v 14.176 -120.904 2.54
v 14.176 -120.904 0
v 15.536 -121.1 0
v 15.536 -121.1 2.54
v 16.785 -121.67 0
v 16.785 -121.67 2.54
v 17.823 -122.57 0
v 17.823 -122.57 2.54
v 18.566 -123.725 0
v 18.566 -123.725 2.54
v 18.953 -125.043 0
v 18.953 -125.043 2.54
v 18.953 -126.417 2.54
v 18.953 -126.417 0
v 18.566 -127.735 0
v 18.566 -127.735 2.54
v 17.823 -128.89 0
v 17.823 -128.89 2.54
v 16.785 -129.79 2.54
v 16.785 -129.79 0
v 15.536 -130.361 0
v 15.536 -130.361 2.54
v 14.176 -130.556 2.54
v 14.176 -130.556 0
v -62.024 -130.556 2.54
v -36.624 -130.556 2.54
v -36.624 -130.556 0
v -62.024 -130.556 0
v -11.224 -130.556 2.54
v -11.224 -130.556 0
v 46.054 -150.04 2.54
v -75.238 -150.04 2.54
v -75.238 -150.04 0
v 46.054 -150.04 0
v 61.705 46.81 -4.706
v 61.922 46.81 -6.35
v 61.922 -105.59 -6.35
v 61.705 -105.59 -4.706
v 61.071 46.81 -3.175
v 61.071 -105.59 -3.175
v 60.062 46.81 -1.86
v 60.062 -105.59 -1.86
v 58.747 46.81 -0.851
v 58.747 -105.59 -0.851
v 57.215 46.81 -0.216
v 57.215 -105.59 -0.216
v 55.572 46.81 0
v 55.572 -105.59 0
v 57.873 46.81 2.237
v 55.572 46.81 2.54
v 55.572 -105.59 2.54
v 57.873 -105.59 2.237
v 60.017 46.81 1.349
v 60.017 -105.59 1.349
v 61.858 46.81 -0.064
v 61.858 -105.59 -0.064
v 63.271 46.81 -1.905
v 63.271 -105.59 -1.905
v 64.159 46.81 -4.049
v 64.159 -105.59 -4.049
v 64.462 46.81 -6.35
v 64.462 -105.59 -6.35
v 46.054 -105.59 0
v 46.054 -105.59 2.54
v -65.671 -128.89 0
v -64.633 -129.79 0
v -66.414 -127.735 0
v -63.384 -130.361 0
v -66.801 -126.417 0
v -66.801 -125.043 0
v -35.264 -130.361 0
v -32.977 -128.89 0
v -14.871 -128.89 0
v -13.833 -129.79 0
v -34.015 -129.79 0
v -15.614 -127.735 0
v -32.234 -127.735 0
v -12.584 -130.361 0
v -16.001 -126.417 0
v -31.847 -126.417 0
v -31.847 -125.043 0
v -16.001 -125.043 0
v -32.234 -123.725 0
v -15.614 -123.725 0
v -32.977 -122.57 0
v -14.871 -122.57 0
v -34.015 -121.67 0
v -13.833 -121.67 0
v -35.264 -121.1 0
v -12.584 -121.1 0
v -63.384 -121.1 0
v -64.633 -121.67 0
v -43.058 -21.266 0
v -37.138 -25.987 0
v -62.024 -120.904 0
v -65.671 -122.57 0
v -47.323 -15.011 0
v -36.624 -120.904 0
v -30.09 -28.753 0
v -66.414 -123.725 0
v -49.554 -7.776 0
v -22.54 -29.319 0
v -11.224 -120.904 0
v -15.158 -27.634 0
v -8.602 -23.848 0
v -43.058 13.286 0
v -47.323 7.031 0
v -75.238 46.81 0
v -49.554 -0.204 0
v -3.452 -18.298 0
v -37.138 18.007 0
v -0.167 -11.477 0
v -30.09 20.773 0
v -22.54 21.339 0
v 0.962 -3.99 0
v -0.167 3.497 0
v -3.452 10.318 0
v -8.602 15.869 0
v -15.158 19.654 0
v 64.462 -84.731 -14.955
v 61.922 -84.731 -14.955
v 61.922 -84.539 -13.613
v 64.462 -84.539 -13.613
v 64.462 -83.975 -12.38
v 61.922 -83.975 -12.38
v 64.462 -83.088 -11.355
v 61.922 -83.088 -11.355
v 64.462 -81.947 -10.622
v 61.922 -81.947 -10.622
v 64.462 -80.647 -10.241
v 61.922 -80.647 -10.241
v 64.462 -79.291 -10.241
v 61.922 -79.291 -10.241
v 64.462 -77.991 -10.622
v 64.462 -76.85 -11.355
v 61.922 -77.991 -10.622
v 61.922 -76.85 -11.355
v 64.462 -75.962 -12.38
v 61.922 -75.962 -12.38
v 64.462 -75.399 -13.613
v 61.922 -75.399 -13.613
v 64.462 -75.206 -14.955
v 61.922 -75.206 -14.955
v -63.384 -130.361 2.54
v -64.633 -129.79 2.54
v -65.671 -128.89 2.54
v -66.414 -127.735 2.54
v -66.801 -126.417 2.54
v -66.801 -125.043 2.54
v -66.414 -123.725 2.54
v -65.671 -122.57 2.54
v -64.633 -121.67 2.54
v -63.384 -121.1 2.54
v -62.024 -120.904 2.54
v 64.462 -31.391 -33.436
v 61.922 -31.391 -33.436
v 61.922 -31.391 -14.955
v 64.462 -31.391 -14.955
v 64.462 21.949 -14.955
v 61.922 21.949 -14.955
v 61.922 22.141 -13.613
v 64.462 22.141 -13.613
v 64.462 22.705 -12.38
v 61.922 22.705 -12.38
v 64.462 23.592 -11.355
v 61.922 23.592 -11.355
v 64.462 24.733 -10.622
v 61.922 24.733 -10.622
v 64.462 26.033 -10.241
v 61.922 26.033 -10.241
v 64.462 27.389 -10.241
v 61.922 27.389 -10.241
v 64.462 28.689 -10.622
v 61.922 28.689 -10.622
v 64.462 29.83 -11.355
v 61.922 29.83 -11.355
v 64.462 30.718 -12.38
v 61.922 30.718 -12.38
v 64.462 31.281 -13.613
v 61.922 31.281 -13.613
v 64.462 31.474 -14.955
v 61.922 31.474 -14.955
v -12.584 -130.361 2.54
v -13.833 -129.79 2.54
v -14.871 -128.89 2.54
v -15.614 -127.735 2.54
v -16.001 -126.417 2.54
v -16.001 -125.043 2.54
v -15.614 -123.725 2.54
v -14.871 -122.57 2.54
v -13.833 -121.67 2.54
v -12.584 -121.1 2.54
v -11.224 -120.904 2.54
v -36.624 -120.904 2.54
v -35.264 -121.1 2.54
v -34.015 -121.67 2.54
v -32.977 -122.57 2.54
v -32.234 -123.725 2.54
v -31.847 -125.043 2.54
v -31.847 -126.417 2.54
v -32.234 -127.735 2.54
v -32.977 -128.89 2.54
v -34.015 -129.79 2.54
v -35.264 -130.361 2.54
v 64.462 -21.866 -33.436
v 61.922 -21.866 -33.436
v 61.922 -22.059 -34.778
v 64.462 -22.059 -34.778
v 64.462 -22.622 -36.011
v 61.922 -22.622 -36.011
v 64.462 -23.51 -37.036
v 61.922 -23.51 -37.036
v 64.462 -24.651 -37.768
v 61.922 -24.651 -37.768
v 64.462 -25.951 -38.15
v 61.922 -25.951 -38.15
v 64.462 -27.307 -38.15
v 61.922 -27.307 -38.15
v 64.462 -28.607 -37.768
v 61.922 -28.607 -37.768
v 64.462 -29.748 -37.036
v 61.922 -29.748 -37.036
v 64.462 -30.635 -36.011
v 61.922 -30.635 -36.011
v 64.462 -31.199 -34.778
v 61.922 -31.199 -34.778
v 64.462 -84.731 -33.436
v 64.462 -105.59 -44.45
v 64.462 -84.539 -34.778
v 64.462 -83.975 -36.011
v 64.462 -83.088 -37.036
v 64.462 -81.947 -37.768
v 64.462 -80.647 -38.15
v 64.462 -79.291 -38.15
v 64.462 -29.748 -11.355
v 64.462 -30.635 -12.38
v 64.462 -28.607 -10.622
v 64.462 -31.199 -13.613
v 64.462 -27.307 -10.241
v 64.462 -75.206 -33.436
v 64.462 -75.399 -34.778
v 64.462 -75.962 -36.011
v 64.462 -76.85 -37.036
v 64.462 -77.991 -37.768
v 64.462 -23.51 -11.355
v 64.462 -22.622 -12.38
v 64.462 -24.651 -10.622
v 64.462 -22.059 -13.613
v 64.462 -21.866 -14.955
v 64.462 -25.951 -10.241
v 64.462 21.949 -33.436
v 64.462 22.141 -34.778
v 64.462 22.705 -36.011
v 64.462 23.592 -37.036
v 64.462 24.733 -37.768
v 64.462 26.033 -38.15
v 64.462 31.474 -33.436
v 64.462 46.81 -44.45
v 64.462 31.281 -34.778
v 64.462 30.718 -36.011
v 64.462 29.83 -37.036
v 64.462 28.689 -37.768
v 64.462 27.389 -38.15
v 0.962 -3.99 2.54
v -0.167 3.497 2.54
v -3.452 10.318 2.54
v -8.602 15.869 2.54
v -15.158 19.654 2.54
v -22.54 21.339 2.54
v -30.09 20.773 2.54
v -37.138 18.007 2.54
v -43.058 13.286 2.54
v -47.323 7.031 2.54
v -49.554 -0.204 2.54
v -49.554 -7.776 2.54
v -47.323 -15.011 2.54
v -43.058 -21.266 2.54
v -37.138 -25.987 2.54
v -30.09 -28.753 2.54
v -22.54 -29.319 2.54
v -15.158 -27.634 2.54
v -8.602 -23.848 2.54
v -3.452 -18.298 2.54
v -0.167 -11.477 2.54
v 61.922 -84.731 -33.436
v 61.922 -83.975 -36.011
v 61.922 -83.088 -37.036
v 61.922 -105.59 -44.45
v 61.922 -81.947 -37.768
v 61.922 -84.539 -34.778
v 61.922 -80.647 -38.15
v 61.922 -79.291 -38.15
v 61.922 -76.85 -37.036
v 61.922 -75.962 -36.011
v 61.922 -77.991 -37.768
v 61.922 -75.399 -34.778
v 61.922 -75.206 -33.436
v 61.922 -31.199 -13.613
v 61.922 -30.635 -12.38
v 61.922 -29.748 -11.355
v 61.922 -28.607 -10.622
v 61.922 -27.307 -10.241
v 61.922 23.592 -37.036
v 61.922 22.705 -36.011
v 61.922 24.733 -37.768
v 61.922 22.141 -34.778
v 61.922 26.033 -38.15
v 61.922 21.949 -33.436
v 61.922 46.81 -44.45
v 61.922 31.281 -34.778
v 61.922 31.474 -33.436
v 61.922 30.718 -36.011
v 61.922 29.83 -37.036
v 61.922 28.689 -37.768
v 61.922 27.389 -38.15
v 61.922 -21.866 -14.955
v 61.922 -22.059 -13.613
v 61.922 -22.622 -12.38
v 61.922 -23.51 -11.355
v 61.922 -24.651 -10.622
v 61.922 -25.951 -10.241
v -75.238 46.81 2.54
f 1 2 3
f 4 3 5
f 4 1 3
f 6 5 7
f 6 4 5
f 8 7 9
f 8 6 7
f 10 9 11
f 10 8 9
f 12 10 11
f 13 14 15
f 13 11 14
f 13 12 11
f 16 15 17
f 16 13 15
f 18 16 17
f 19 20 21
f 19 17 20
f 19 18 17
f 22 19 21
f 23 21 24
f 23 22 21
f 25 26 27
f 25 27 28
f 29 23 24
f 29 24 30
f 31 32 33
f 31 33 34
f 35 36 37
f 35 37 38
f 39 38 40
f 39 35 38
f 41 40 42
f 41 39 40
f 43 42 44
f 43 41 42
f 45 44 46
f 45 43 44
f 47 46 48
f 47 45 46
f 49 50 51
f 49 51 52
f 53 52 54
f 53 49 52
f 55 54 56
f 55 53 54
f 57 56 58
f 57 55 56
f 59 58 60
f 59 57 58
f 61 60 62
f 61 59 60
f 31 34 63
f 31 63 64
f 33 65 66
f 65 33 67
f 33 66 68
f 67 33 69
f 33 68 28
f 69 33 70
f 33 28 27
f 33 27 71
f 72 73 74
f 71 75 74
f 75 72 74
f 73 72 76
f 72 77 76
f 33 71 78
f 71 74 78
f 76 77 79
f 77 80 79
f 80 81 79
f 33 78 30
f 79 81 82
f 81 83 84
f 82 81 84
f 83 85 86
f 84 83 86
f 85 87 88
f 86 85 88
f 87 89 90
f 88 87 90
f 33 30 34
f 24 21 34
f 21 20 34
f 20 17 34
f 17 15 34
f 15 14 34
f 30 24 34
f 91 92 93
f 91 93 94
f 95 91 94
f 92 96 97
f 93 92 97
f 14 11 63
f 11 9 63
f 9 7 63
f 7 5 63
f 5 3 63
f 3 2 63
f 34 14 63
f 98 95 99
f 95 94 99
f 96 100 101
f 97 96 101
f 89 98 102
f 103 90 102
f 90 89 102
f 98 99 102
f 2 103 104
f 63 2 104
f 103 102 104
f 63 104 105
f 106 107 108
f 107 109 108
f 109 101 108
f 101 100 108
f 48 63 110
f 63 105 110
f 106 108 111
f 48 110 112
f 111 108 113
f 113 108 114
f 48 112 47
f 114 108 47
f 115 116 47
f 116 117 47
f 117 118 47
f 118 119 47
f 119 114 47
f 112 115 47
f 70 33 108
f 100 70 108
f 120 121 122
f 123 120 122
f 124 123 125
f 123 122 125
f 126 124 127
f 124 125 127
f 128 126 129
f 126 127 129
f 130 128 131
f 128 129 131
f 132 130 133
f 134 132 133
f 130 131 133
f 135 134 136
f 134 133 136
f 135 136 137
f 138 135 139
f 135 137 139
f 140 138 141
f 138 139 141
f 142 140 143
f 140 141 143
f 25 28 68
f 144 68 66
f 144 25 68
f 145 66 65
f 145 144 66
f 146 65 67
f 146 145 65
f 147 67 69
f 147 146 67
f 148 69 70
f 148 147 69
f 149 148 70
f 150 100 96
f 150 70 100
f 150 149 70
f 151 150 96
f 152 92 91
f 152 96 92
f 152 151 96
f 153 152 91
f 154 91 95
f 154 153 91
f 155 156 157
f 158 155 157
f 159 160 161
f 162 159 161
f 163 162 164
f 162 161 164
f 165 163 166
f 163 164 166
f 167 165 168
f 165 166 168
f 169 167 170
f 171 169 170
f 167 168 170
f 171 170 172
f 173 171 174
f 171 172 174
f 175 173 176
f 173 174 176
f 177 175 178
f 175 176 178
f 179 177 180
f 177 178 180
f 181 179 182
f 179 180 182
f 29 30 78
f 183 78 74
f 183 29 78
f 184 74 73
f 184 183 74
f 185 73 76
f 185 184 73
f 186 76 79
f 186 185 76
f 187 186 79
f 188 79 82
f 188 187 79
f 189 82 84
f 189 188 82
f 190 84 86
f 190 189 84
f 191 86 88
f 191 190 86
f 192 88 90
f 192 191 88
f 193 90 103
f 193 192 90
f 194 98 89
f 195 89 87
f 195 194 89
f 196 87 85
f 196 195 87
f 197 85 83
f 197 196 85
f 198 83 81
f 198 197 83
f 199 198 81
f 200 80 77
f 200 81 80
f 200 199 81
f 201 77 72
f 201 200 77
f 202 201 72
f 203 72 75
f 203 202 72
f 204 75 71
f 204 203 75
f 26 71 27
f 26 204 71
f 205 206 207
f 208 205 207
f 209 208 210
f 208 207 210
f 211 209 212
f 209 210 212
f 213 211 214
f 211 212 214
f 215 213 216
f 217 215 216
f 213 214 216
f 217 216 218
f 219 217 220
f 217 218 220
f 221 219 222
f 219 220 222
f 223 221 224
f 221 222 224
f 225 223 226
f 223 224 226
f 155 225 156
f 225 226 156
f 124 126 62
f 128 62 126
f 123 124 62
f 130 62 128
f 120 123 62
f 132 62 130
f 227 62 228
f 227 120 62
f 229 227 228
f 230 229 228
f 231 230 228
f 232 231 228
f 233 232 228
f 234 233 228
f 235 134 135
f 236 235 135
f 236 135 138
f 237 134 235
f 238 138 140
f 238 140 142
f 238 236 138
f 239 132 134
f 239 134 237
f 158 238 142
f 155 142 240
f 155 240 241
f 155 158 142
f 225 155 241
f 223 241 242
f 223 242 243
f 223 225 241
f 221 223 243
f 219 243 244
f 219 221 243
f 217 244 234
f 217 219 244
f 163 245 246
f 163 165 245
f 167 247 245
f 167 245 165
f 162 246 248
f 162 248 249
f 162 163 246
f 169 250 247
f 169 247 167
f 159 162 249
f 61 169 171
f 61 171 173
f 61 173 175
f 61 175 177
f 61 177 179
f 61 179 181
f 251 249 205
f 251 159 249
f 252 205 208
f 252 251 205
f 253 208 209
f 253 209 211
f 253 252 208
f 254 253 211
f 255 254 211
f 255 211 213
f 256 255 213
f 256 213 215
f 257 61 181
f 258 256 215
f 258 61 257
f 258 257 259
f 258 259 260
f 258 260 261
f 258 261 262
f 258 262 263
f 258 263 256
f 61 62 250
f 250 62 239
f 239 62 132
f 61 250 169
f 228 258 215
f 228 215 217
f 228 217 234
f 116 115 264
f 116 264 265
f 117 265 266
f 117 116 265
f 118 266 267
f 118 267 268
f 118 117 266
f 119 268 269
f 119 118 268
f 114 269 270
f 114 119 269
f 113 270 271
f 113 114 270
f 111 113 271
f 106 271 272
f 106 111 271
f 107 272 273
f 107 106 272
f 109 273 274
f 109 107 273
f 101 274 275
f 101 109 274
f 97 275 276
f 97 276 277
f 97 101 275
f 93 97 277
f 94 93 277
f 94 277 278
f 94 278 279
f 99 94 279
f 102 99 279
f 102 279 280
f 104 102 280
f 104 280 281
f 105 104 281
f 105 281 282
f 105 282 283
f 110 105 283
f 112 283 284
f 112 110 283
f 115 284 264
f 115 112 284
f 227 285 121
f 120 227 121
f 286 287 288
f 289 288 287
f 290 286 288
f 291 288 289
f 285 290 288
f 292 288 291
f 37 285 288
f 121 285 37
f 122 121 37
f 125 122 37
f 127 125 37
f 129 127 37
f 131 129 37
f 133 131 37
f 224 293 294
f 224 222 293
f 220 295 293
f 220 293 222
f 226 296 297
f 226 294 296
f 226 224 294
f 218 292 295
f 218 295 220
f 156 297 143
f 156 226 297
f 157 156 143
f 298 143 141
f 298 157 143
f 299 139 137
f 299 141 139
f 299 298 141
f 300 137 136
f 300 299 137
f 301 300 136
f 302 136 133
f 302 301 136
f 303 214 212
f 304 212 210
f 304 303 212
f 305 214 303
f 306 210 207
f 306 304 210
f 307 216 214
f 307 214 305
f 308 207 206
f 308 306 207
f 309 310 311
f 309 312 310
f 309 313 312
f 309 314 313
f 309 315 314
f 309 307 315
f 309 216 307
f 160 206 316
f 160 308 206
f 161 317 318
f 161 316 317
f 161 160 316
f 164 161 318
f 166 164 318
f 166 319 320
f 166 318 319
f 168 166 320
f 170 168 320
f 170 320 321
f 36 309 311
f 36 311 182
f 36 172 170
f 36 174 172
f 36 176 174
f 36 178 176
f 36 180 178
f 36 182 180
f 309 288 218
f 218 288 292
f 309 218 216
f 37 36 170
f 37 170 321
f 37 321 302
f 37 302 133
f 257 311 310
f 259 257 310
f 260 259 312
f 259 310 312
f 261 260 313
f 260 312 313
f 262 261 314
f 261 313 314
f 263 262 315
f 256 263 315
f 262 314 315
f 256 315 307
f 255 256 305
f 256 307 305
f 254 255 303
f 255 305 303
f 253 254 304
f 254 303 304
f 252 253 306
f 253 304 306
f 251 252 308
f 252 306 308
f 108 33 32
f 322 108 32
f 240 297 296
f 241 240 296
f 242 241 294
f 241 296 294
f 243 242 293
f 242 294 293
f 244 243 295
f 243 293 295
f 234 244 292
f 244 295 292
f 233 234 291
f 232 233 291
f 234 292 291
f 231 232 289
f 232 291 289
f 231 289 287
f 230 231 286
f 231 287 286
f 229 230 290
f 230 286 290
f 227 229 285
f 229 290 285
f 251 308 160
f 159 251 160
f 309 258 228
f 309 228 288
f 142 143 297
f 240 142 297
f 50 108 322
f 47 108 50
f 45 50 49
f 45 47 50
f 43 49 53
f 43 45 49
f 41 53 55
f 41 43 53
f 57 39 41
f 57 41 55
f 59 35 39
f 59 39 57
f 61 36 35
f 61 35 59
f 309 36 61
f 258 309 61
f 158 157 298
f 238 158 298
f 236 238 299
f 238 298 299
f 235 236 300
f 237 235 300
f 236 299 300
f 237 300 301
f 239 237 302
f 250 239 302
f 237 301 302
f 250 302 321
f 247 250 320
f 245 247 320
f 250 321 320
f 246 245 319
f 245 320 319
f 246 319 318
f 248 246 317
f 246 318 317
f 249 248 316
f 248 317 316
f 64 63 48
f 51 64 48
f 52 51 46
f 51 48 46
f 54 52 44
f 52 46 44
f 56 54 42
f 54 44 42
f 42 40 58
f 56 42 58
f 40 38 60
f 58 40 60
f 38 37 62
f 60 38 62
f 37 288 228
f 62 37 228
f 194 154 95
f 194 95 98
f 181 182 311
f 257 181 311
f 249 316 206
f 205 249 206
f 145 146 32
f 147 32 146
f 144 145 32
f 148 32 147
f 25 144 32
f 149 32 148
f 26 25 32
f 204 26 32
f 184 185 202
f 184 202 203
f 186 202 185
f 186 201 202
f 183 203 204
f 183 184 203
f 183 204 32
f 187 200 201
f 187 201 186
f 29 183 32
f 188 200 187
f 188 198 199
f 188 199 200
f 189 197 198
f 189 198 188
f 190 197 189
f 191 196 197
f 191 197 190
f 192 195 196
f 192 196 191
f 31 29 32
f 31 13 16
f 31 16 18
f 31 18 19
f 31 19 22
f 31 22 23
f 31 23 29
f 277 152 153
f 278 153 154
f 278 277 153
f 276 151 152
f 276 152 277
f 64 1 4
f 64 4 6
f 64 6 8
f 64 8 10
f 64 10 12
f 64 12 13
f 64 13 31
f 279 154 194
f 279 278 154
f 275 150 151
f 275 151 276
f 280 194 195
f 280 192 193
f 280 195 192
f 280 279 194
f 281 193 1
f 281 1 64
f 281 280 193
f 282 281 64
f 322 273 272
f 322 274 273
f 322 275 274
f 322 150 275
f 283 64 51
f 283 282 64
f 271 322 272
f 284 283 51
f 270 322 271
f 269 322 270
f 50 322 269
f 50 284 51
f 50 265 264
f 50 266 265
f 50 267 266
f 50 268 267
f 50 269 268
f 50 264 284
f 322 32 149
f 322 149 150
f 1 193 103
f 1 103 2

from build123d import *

# Parameters (mm, degrees)
SKETCH1_W                    = 139.7
SKETCH1_H                    = 152.4
SKETCH1_R                    = 25.4
BOSS_EXTRUDE1_DEPTH          = 2.54
EDGE_FLANGE1_STRIP_W         = 22.86
EDGE_FLANGE1_STRIP_H         = 2.54
EDGE_FLANGE1_STRIP_CUT_DEPTH = 152.4
EDGE_FLANGE1_DEPTH           = 152.4
CUT_EXTRUDE3_DEPTH           = 2.54
SKETCH10_W                   = 121.292072418
SKETCH10_H                   = 2.54
BOSS_EXTRUDE2_DEPTH          = 44.45
CUT_EXTRUDE2_DEPTH           = 44.45


# Sheet-metal steps are written as plain solids
with BuildPart() as part:
    # Sketch1 → Boss-Extrude1 (new body)
    with BuildSketch(Plane.XY):
        with Locations((-5.388148668, -29.389901823)):
            Rectangle(SKETCH1_W, SKETCH1_H)
        with Locations((-24.438148668, -3.989901823)):
            Circle(SKETCH1_R, mode=Mode.SUBTRACT)
    extrude(amount=BOSS_EXTRUDE1_DEPTH)

    # Edge-Flange1 strip (across the edge) → Edge-Flange1 strip cut (cut)
    with BuildSketch(Plane(origin=(64.461851332, 46.810098177, 0), x_dir=(-1, 0, 0), z_dir=(0, -1, 0))):
        with Locations((-2.54, -1.27)):
            Rectangle(EDGE_FLANGE1_STRIP_W, EDGE_FLANGE1_STRIP_H)
    extrude(amount=EDGE_FLANGE1_STRIP_CUT_DEPTH, mode=Mode.SUBTRACT)

    # Edge-Flange1 section (across the edge) → Edge-Flange1 (add)
    with BuildSketch(Plane(origin=(64.461851332, 46.810098177, 0), x_dir=(-1, 0, 0), z_dir=(0, -1, 0))):
        with BuildLine():
            Line((0, 6.35), (0, 44.45))
            Line((0, 44.45), (2.54, 44.45))
            Line((2.54, 44.45), (2.54, 6.35))
            ThreePointArc((2.54, 6.35), (4.399871939, 1.859871939), (8.89, 0))
            Line((8.89, 0), (8.89, -2.54))
            ThreePointArc((8.89, -2.54), (2.603820715, 0.063820715), (0, 6.35))
        make_face()
    extrude(amount=EDGE_FLANGE1_DEPTH)

    # Sketch9 → Cut-Extrude3 (cut)
    with BuildSketch(Plane.ZY.offset(-61.921851332)):
        with BuildLine():
            Line((-14.954545697, 31.473568276), (-33.436292004, 31.473568276))
            ThreePointArc((-33.436292004, 31.473568276), (-38.198792004, 26.711068276), (-33.436292004, 21.948568276))
            Line((-33.436292004, 21.948568276), (-14.954545697, 21.948568276))
            ThreePointArc((-14.954545697, 21.948568276), (-10.192045697, 26.711068276), (-14.954545697, 31.473568276))
        make_face()
        with BuildLine():
            Line((-14.954545697, -21.866431724), (-33.436292004, -21.866431724))
            ThreePointArc((-33.436292004, -21.866431724), (-38.198792004, -26.628931724), (-33.436292004, -31.391431724))
            Line((-33.436292004, -31.391431724), (-14.954545697, -31.391431724))
            ThreePointArc((-14.954545697, -31.391431724), (-10.192045697, -26.628931724), (-14.954545697, -21.866431724))
        make_face()
        with BuildLine():
            Line((-14.954545697, -75.206431724), (-33.436292004, -75.206431724))
            ThreePointArc((-33.436292004, -75.206431724), (-38.198792004, -79.968931724), (-33.436292004, -84.731431724))
            Line((-33.436292004, -84.731431724), (-14.954545697, -84.731431724))
            ThreePointArc((-14.954545697, -84.731431724), (-10.192045697, -79.968931724), (-14.954545697, -75.206431724))
        make_face()
    extrude(amount=-CUT_EXTRUDE3_DEPTH, mode=Mode.SUBTRACT)

    # Sketch10 → Boss-Extrude2 (add)
    with BuildSketch(Plane.XZ.offset(105.589901823)):
        with Locations((-14.592112459, 1.27)):
            Rectangle(SKETCH10_W, SKETCH10_H)
    extrude(amount=BOSS_EXTRUDE2_DEPTH)

    # Sketch11 → Cut-Extrude2 (cut)
    with BuildSketch(Plane.XY.offset(2.54)):
        with BuildLine():
            Line((-62.024050091, -120.904110835), (-36.624050091, -120.904110835))
            ThreePointArc((-36.624050091, -120.904110835), (-31.798050091, -125.730110835), (-36.624050091, -130.556110835))
            Line((-36.624050091, -130.556110835), (-62.024050091, -130.556110835))
            ThreePointArc((-62.024050091, -130.556110835), (-66.850050091, -125.730110835), (-62.024050091, -120.904110835))
        make_face()
        with BuildLine():
            Line((-11.224050091, -120.904110835), (14.175949909, -120.904110835))
            ThreePointArc((14.175949909, -120.904110835), (19.001949909, -125.730110835), (14.175949909, -130.556110835))
            Line((14.175949909, -130.556110835), (-11.224050091, -130.556110835))
            ThreePointArc((-11.224050091, -130.556110835), (-16.050050091, -125.730110835), (-11.224050091, -120.904110835))
        make_face()
    extrude(amount=-CUT_EXTRUDE2_DEPTH, mode=Mode.SUBTRACT)


solid = part.part
